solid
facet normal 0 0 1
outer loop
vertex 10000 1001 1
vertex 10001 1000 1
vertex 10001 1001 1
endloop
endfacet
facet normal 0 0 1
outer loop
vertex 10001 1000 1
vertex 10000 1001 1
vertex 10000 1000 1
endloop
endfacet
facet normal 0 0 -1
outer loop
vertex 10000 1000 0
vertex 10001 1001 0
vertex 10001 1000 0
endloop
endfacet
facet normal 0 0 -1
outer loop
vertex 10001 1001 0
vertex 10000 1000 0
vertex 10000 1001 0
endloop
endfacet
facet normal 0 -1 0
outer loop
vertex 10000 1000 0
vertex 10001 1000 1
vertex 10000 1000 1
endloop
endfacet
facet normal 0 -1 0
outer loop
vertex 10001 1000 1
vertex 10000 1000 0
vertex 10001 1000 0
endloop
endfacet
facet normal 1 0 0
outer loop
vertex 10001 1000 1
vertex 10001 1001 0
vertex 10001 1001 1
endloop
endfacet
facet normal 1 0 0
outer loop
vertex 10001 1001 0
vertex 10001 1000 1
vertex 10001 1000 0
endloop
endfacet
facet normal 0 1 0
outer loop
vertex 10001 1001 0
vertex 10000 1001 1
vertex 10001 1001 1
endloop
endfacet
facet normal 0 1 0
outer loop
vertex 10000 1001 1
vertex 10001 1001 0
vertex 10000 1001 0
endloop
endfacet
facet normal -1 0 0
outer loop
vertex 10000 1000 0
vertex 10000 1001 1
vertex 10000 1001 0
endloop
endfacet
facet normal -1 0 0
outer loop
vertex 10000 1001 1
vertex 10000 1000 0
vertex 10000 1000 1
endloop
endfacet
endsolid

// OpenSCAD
// file: 05_Modulo_Z_Caneta.scad
/*
  Modulo Z complacente.

  O motor move o embolo 8 mm. Na posicao baixa, 2 mm desse curso comprimem a
  mola e os 6 mm restantes ficam disponiveis como afastamento real da folha.
  A mola metalica define a forca; o PETG/PLA apenas guia lateralmente.
*/

include <00_Parametros.scad>;

function spring_force(compression=0) =
  spring_rate_target*(spring_preload+compression);

module modulo_z_pen_plunger(include_rack=true) {
  pen_r = pen_diameter/2 + pen_clearance;
  difference() {
    union() {
      translate([-z_carriage_w/2,-z_carriage_d/2,0])
        cube([z_carriage_w,z_carriage_d,z_carriage_body_h]);

      for (sx=[-1,1])
        translate([sx < 0 ? -z_cage_w/2 : z_cage_w/2-z_post_w,
                   -z_cage_d/2,z_carriage_body_h-EPS])
          cube([z_post_w,z_cage_d,
                z_cap_bottom-z_carriage_body_h+EPS]);

      translate([-z_cage_w/2,-z_cage_d/2,z_cap_bottom])
        cube([z_cage_w,z_cage_d,z_cap_h]);

      if (include_rack)
        translate([z_rack_base_x,0,z_rack_start])
          rack_z(z_rack_length);
    }

    translate([0,0,-EPS])
      cylinder(r=pen_r,h=z_cap_bottom+z_cap_h+2*EPS);
  }
}

module z_pen_collar() {
  slit_w = 1.0;
  difference() {
    union() {
      cylinder(r=z_collar_od/2,h=z_collar_h);
      translate([-4,4,0]) cube([3.5,6,z_collar_h]);
      translate([0.5,4,0]) cube([3.5,6,z_collar_h]);
    }
    translate([0,0,-EPS])
      cylinder(r=pen_diameter/2+0.05,h=z_collar_h+2*EPS);
    translate([-slit_w/2,0,-EPS])
      cube([slit_w,11,z_collar_h+2*EPS]);
    translate([-6,7,z_collar_h/2]) rotate([0,90,0])
      cylinder(r=1.6,h=12);
  }
}

module z_compression_spring_reference(compression=0) {
  spring_h = spring_length-spring_preload-compression;
  assert(compression >= 0 && compression <= compliance_travel,
         "Compressao da mola fora do curso complacente");
  color([0.75,0.75,0.78,0.7]) difference() {
    cylinder(r=spring_outer_diameter/2,h=spring_h);
    translate([0,0,-EPS])
      cylinder(r=spring_inner_diameter/2,h=spring_h+2*EPS);
  }
}

module pen_reference(tip_z=pen_tip_uncompressed_z, length=140) {
  color([0.10,0.10,0.12]) {
    translate([0,0,tip_z+3]) cylinder(r=pen_diameter/2,h=length-3);
    translate([0,0,tip_z]) cylinder(r1=0.45,r2=pen_diameter/2,h=3);
  }
}

module modulo_z_pen_assembly(compression=0, show_pen=true) {
  modulo_z_pen_plunger();
  translate([0,0,z_carriage_body_h+compression]) z_pen_collar();
  translate([0,0,z_carriage_body_h+z_collar_h+compression])
    z_compression_spring_reference(compression);
  if (show_pen) pen_reference(tip_z=pen_tip_uncompressed_z+compression);
}

// Layout de impressao: embolo e colar. A mola e a caneta sao referencias.
modulo_z_pen_plunger();
translate([32,0,0]) z_pen_collar();
// file: 04_Carrinho_Y.scad
/*
  Carrinho Y para a viga-caixao.

  O motor Y fica baixo e fora da lateral +X. O motor Z fica na face dianteira;
  os dois envelopes nao se cruzam. Uma torre de guia eleva o comprimento de
  apoio do embolo Z de 14 para 24 mm, reduzindo a folga angular da caneta.
*/

include <00_Parametros.scad>;

module carrinho_y() {
  dt_local_x = y_carriage_w/2;
  rack_local_x = dt_local_x + (y_rack_center_x-y_dovetail_center_x);
  motor_y_axis_z = rack_pitch_height + gear_pitch_radius + gear_mesh_clearance;
  motor_y_face_x = y_carriage_w;
  motor_y_center_y = y_carriage_length/2;
  z_slot_w = z_carriage_w + 2*slide_clearance_z;
  z_slot_d = z_carriage_d + 2*slide_clearance_z;
  tower_wall = 2.4;
  bottom_relief = 0.25;

  difference() {
    union() {
      cube([y_carriage_w,y_carriage_length,y_carriage_h]);

      // Torre anti-inclinacao do embolo Z.
      translate([z_axis_center_x_local-z_slot_w/2-tower_wall,
                 z_axis_center_y_local-z_slot_d/2-tower_wall,0])
        cube([z_slot_w+2*tower_wall,z_slot_d+2*tower_wall,
              z_guide_total_h]);

      // Flanges do motor Y, eixo apontando para -X.
      for (hy=[motor_y_center_y-motor_flange_dist/2,
               motor_y_center_y+motor_flange_dist/2])
        translate([motor_y_face_x,hy,motor_y_axis_z])
          rotate([0,-90,0]) cylinder(r=wall_screw,h=3.2);

      // Flanges do motor Z; a orelha direita se liga ao corpo por um pescoco.
      for (hx=[z_motor_axis_x_local-motor_flange_dist/2,
               z_motor_axis_x_local+motor_flange_dist/2])
        hull() {
          translate([hx,0,z_motor_axis_z_local])
            rotate([-90,0,0]) cylinder(r=wall_screw,h=3.2);
          translate([min(max(hx,wall_screw),y_carriage_w-wall_screw),
                     0,y_carriage_h-1])
            rotate([-90,0,0]) cylinder(r=wall_screw,h=3.2);
        }
    }

    // Canais rasos: no maximo 10 mm de ponte, sem suporte no fatiador.
    for (g=[[0,9],[12,8],[23,8],[34,10]])
      translate([g[0],-EPS,-EPS])
        cube([g[1],y_carriage_length+2*EPS,bottom_relief+EPS]);

    translate([dt_local_x,0,-0.5])
      dovetail_female_y(y_carriage_length);

    // Canal para a cremalheira Y e bolso do pinhao.
    translate([rack_local_x-(rack_width+0.8)/2,-EPS,-EPS])
      cube([rack_width+0.8,y_carriage_length+2*EPS,tooth_height+0.7]);
    translate([rack_local_x-pinion_thickness/2-0.2,
               motor_y_center_y,motor_y_axis_z])
      rotate([0,90,0])
        cylinder(r=gear_outer_radius+0.35,h=pinion_thickness+0.4);

    // Guia Z passante e corredor externo da cremalheira vertical.
    translate([z_axis_center_x_local-z_slot_w/2,
               z_axis_center_y_local-z_slot_d/2,-EPS])
      cube([z_slot_w,z_slot_d,z_guide_total_h+2*EPS]);
    translate([z_axis_center_x_local+z_rack_base_x-0.8,
               z_axis_center_y_local-(rack_width+0.8)/2,-EPS])
      cube([tooth_height+1.6,rack_width+0.8,z_guide_total_h+2*EPS]);

    // Bolso do pinhao Z.
    translate([z_motor_axis_x_local,
               z_axis_center_y_local-pinion_thickness/2-0.2,
               z_motor_axis_z_local])
      rotate([-90,0,0])
        cylinder(r=gear_outer_radius+0.35,h=pinion_thickness+0.4);

    for (hy=[motor_y_center_y-motor_flange_dist/2,
             motor_y_center_y+motor_flange_dist/2])
      translate([motor_y_face_x+EPS,hy,motor_y_axis_z])
        rotate([0,-90,0]) cylinder(r=motor_flange_hole_r,h=8);

    for (hx=[z_motor_axis_x_local-motor_flange_dist/2,
             z_motor_axis_x_local+motor_flange_dist/2])
      translate([hx,-EPS,z_motor_axis_z_local])
        rotate([-90,0,0]) cylinder(r=motor_flange_hole_r,h=8);
  }
}

carrinho_y();
// file: 03_Trilho_Y.scad
/*
  Viga/guia Y apoiada nas duas extremidades.

  Secao 30 x 24 mm, parede de 1,8 mm e diafragmas a cada 40 mm. A secao
  fechada resiste muito melhor a torcao que uma placa macica de massa parecida.
  Os encaixes inferiores posicionam a viga; um M3 em cada face de extremidade
  impede levantamento. Imprimir em PLA, como modelado, sem suporte.

  Nota STL: e uma unica peca material. Os seis vazios fechados geram sete
  cascas topologicas (uma externa + seis internas) em analisadores de malha.
*/

include <00_Parametros.scad>;

module y_box_shell(length=y_rail_length) {
  segment_count = floor(length/y_beam_rib_pitch);
  difference() {
    translate([-y_beam_w/2,0,0]) cube([y_beam_w,length,y_beam_h]);

    // Cavidades segmentadas deixam paredes externas e diafragmas integrais.
    for (k=[0:segment_count-1]) {
      cavity_y0 = k*y_beam_rib_pitch
                   + (k == 0 ? y_beam_wall : y_beam_rib_t/2);
      cavity_y1 = (k == segment_count-1)
                   ? length-y_beam_wall
                   : (k+1)*y_beam_rib_pitch-y_beam_rib_t/2;
      translate([-y_beam_w/2+y_beam_wall,cavity_y0,y_beam_wall])
        cube([y_beam_w-2*y_beam_wall,
              cavity_y1-cavity_y0,
              y_beam_h-2*y_beam_wall]);
    }
  }
}

module trilho_y(length=y_rail_length, include_rack=true) {
  front_socket_y = beam_key_inset;
  rear_socket_y = length-beam_key_inset-beam_key_d;
  socket_w = beam_key_w + 2*beam_socket_clearance;
  socket_d = beam_key_d + beam_socket_clearance;
  socket_h = beam_key_h + beam_socket_clearance;

  difference() {
    union() {
      y_box_shell(length);

      // Material apenas ao redor dos encaixes, sem preencher as pontas inteiras.
      translate([-12,0,0]) cube([24,beam_key_d+4,6]);
      translate([-12,length-beam_key_d-4,0]) cube([24,beam_key_d+4,6]);

      translate([y_dovetail_center_x,0,y_beam_h-0.5])
        dovetail_male_y(length);
      if (include_rack)
        translate([y_rack_center_x,0,y_beam_h]) rack_y(length);
    }

    // Bolsos cegos: a parede da extremidade permanece para apoiar a cabeca M3.
    translate([-socket_w/2,front_socket_y-EPS,-EPS])
      cube([socket_w,socket_d+EPS,socket_h+EPS]);
    translate([-socket_w/2,rear_socket_y-beam_socket_clearance,-EPS])
      cube([socket_w,socket_d+EPS,socket_h+EPS]);

    // Um parafuso axial por ponta. O parafuso rosca na chaveta do carrinho.
    translate([0,-EPS,beam_key_h/2])
      rotate([-90,0,0]) cylinder(r=beam_mount_hole_r,
                                 h=beam_key_inset+4.0);
    translate([0,length+EPS,beam_key_h/2])
      rotate([90,0,0]) cylinder(r=beam_mount_hole_r,
                                h=beam_key_inset+4.0);
  }
}

trilho_y();
// file: 02_Carrinho_X.scad
/*
  Carrinhos do portico X.

  Pecas deste arquivo:
    1. carrinho_x_motriz()       — PLA, motor e pinhao X
    2. sapata_x_passiva()        — PETG, desliza no trilho traseiro
    3. sela_x_passiva()          — PLA, recebe a viga e flutua +/-0,60 mm em Y

  A sapata passiva e retida por um unico M3x8. O ressalto central fica 0,20 mm
  acima da sela: o parafuso aperta no ressalto, nao bloqueia o movimento lateral.
*/

include <00_Parametros.scad>;

module front_beam_key() {
  difference() {
    translate([x_carriage_length/2-beam_key_w/2,
               base_w/2+beam_key_inset, x_carriage_h-EPS])
      cube([beam_key_w,beam_key_d,beam_key_h+EPS]);
    translate([x_carriage_length/2,base_w/2+beam_key_inset-EPS,
               x_carriage_h+beam_key_h/2])
      rotate([-90,0,0]) cylinder(r=1.35,h=beam_key_d+2*EPS);
  }
}

module rear_beam_key(z0=passive_saddle_h) {
  difference() {
    translate([x_carriage_length/2-beam_key_w/2,
               base_w/2-beam_key_inset-beam_key_d,z0-EPS])
      cube([beam_key_w,beam_key_d,beam_key_h+EPS]);
    translate([x_carriage_length/2,
               base_w/2-beam_key_inset-beam_key_d-EPS,
               z0+beam_key_h/2])
      rotate([-90,0,0]) cylinder(r=1.35,h=beam_key_d+2*EPS);
    // Alivio do ombro flutuante no limite de +/-0,60 mm.
    hull()
      for (dy=[-passive_float,passive_float])
        translate([x_carriage_length/2,base_w/2+dy,z0-EPS])
          cylinder(r=2.45,h=beam_key_h+2*EPS);
  }
}

module carrinho_x_motriz() {
  motor_x_axis_z = rack_pitch_height + gear_pitch_radius + gear_mesh_clearance;
  motor_face_y = -3.3;

  difference() {
    union() {
      cube([x_carriage_length,base_w,x_carriage_h]);

      // Orelhas compactas: os dois furos ficam dentro dos 56 mm do carrinho.
      for (hx=[x_carriage_length/2-motor_flange_dist/2,
               x_carriage_length/2+motor_flange_dist/2])
        translate([hx,motor_face_y,motor_x_axis_z])
          rotate([-90,0,0]) cylinder(r=wall_screw,h=3.4);

      front_beam_key();
    }

    translate([0,base_w/2,-0.5])
      dovetail_female_x(x_carriage_length);

    // Passagem da cremalheira e bolso do pinhao.
    translate([-EPS,x_rack_center_y-(rack_width+0.8)/2,-EPS])
      cube([x_carriage_length+2*EPS,rack_width+0.8,tooth_height+0.7]);
    translate([x_carriage_length/2,
               x_rack_center_y-pinion_thickness/2-0.2,motor_x_axis_z])
      rotate([-90,0,0])
        cylinder(r=gear_outer_radius+0.35,h=pinion_thickness+0.4);

    for (hx=[x_carriage_length/2-motor_flange_dist/2,
             x_carriage_length/2+motor_flange_dist/2])
      translate([hx,motor_face_y-EPS,motor_x_axis_z])
        rotate([-90,0,0]) cylinder(r=motor_flange_hole_r,h=8);
  }
}

module sapata_x_passiva() {
  shoulder_h = passive_saddle_h + 0.20;
  difference() {
    union() {
      cube([x_carriage_length,base_w,passive_shoe_h]);
      translate([x_carriage_length/2-passive_boss_w/2,
                 base_w/2-passive_boss_d/2,passive_shoe_h-EPS])
        cube([passive_boss_w,passive_boss_d,passive_boss_h+EPS]);
      // Ombro de aperto: recebe a cabeca do M3 sem prensar a sela.
      translate([x_carriage_length/2,base_w/2,passive_shoe_h])
        cylinder(r=2.15,h=shoulder_h);
    }
    translate([0,base_w/2,-0.5])
      dovetail_female_x(x_carriage_length);
    translate([x_carriage_length/2,base_w/2,passive_shoe_h-EPS])
      cylinder(r=1.30,h=shoulder_h+2*EPS);
  }
}

module sela_x_passiva() {
  pocket_w = passive_boss_w + 2*pressfit_clearance;
  pocket_d = passive_boss_d + 2*passive_float + 2*pressfit_clearance;
  slot_r = 2.35;
  slide_relief = 0.25;

  difference() {
    union() {
      cube([x_carriage_length,base_w,passive_saddle_h]);
      rear_beam_key();
    }

    // Canais rasos: ponte maxima de 10 mm e apenas 21% de contato.
    for (g=[[0,9],[12,10],[25,10],[38,10],[51,5]])
      translate([g[0],-EPS,-EPS])
        cube([g[1],base_w+2*EPS,slide_relief+EPS]);

    // Bolso restringe X e libera somente o desalinhamento transversal Y.
    translate([x_carriage_length/2-pocket_w/2,
               base_w/2-pocket_d/2,-EPS])
      cube([pocket_w,pocket_d,passive_boss_h+pressfit_clearance+EPS]);

    // Rasgo do ombro/parafuso: 1,20 mm de movimento total em Y.
    hull() {
      for (dy=[-passive_float,passive_float])
        translate([x_carriage_length/2,base_w/2+dy,-EPS])
          cylinder(r=slot_r,h=passive_saddle_h+2*EPS);
    }
  }
}

// Alias usado por arquivos antigos e por quem quer apenas o carrinho motriz.
module carrinho_x() carrinho_x_motriz();

// Layout PLA: carrinho motriz e sela rigida. A sapata PETG fica em 02B.
carrinho_x_motriz();
translate([70,0,0]) sela_x_passiva();
// file: 01_Base_Trilho_X.scad
/*
  Trilho X dianteiro/motriz.
  Perfil aberto nervurado: rigido onde importa, sem preencher o volume inteiro.
  Imprimir em PLA, fundo plano no leito, brim de 5 mm.
*/

include <00_Parametros.scad>;

module base_trilho_x(length=x_rail_length, include_rack=true) {
  dt_y = base_w/2;
  rib_w = wall_structural;
  skin_top = base_h-0.4;
  dt_platform_w = dovetail_width_bottom + 1.4;
  rack_platform_w = rack_width + 1.2;

  difference() {
    union() {
      // Piso, duas longarinas laterais e alma central.
      cube([length,base_w,floor_h]);
      cube([length,wall_thin,skin_top]);
      translate([0,base_w-wall_thin,0]) cube([length,wall_thin,skin_top]);
      translate([0,dt_y-rib_w/2,0]) cube([length,rib_w,skin_top]);

      // Mesas locais sob as superficies funcionais.
      translate([0,dt_y-dt_platform_w/2,skin_top-2.0])
        cube([length,dt_platform_w,2.0+EPS]);

      if (include_rack) {
        translate([0,x_rack_center_y-rib_w/2,0])
          cube([length,rib_w,skin_top]);
        translate([0,x_rack_center_y-rack_platform_w/2,skin_top-2.0])
          cube([length,rack_platform_w,2.0+EPS]);
      }

      // Diafragmas de torcao; espacamento de 40 mm.
      for (cx=[40:40:length-20])
        translate([cx-wall_thin/2,wall_thin,floor_h-EPS])
          cube([wall_thin,base_w-2*wall_thin,skin_top-floor_h+EPS]);

      translate([0,dt_y,base_h-0.5]) dovetail_male_x(length);
      if (include_rack)
        translate([0,x_rack_center_y,base_h]) rack_x(length);
    }

    // Quatro pontos evitam que o trilho longo arqueie sobre a base de MDF.
    for (fx=[20,73,147,length-20])
      translate([fx,base_w-5,-EPS]) cylinder(r=2.15,h=floor_h+2*EPS);
  }
}

module trilho_x_motriz() base_trilho_x(include_rack=true);
module trilho_x_passivo() base_trilho_x(include_rack=false);

trilho_x_motriz();
// main file
/*
  Teste CSG das interfaces imprimiveis.
  Resultado correto: somente o cubo marcador de 1 mm em [1000,1000,0].
*/

include <00_Parametros.scad>;
use <01_Base_Trilho_X.scad>;
use <02_Carrinho_X.scad>;
use <03_Trilho_Y.scad>;
use <04_Carrinho_Y.scad>;
use <05_Modulo_Z_Caneta.scad>;

module run_collision_tests() {
translate([10000,1000,0]) cube([1,1,1]);

front_y=-base_w/2;
rear_y=x_rail_spacing-base_w/2;

module driven(px,dz=-0.02)
  translate([px-x_carriage_length/2,front_y,base_h+dz])
    carrinho_x_motriz();
module shoe(px,rail_error=0,dz=-0.02)
  translate([px-x_carriage_length/2,rear_y+rail_error,base_h+dz])
    sapata_x_passiva();
module saddle(px,dz=-0.02)
  translate([px-x_carriage_length/2,rear_y,
             base_h+passive_shoe_h+dz])
    sela_x_passiva();
module beam(px,with_rack=true)
  translate([px,0,y_beam_bottom_z]) trilho_y(include_rack=with_rack);
module cy(px,py)
  translate([px+y_dovetail_center_x-y_carriage_w/2,
             py-z_axis_center_y_local,y_beam_top_z+0.02]) carrinho_y();
module plunger(px,py,pz,with_rack=true)
  translate([px+y_dovetail_center_x-y_carriage_w/2+z_axis_center_x_local,
             py,z_plunger_down_z+pz])
    modulo_z_pen_plunger(include_rack=with_rack);

module pinion_x(px) {
  z=base_h+rack_pitch_height+gear_pitch_radius+gear_mesh_clearance;
  translate([px,front_y+x_rack_center_y-pinion_thickness/2,z])
    rotate([-90,0,0])
      rotate([0,0,pinion_angle(px,+1,pinion_phase_x)]) pinion_gear();
}
module pinion_y(px,py) {
  yy=py-z_axis_center_y_local+y_carriage_length/2;
  z=y_beam_top_z+rack_pitch_height+gear_pitch_radius+gear_mesh_clearance;
  translate([px+y_rack_center_x-pinion_thickness/2,yy,z])
    rotate([0,90,0])
      rotate([0,0,pinion_angle(yy,-1,pinion_phase_y)]) pinion_gear();
}
module pinion_z(px,py,pz) {
  cx=px+y_dovetail_center_x-y_carriage_w/2;
  translate([cx+z_motor_axis_x_local,py-pinion_thickness/2,
             y_beam_top_z+z_motor_axis_z_local])
    rotate([-90,0,0])
      rotate([0,0,pinion_angle(pz,+1,pinion_phase_z)]) pinion_gear();
}

// As secoes sao invariantes ao longo do curso; extremos ficam guardados por
// assertions e pelo arquivo 96. Testar o centro reduz muito o tempo CSG.
px=(X_MIN+X_MAX)/2;
py=(Y_MIN+Y_MAX)/2;
assert(X_MIN-x_carriage_length/2 >= 0);
assert(X_MAX+x_carriage_length/2 <= x_rail_length);
assert(Y_MIN-z_axis_center_y_local >= 0);
assert(Y_MAX-z_axis_center_y_local+y_carriage_length <= y_rail_length+8);

translate([0,0,0]) intersection() {
  translate([0,front_y,0]) trilho_x_motriz();
  driven(px);
}
translate([400,0,0]) intersection() {
  translate([0,rear_y,0]) trilho_x_passivo();
  shoe(px);
}
for (err=[-passive_float,0,passive_float])
  translate([800,0,0]) intersection() {
    shoe(px,err,-0.02); saddle(px,0.02);
  }
translate([1200,0,0]) intersection() { beam(px); driven(px); }
translate([1600,0,0]) intersection() { beam(px); saddle(px); }
translate([2000,0,0]) intersection() {
  beam(px); translate([0,front_y,0]) trilho_x_motriz();
}
translate([2400,0,0]) intersection() {
  beam(px); translate([0,rear_y,0]) trilho_x_passivo();
}

translate([2800,0,0]) intersection() {
  translate([0,front_y,0]) base_trilho_x(include_rack=false);
  pinion_x(px);
}
translate([3200,0,0]) intersection() { driven(px); pinion_x(px); }
translate([3600,0,0]) intersection() { beam(px); cy(px,py); }
translate([4000,0,0]) intersection() { beam(px,false); pinion_y(px,py); }
translate([4400,0,0]) intersection() { cy(px,py); pinion_y(px,py); }

for (pz=[Z_DOWN,Z_UP]) {
  translate([4800,0,0]) intersection() { cy(px,py); plunger(px,py,pz); }
  translate([5200,0,0]) intersection() { cy(px,py); pinion_z(px,py,pz); }
  translate([5600,0,0]) intersection() {
    plunger(px,py,pz,false); pinion_z(px,py,pz);
  }
  translate([6000,0,0]) intersection() { beam(px,false); pinion_z(px,py,pz); }
}
}

// Elimina residuos coplanares de area zero antes da exportacao STL.
render(convexity=20) run_collision_tests();
